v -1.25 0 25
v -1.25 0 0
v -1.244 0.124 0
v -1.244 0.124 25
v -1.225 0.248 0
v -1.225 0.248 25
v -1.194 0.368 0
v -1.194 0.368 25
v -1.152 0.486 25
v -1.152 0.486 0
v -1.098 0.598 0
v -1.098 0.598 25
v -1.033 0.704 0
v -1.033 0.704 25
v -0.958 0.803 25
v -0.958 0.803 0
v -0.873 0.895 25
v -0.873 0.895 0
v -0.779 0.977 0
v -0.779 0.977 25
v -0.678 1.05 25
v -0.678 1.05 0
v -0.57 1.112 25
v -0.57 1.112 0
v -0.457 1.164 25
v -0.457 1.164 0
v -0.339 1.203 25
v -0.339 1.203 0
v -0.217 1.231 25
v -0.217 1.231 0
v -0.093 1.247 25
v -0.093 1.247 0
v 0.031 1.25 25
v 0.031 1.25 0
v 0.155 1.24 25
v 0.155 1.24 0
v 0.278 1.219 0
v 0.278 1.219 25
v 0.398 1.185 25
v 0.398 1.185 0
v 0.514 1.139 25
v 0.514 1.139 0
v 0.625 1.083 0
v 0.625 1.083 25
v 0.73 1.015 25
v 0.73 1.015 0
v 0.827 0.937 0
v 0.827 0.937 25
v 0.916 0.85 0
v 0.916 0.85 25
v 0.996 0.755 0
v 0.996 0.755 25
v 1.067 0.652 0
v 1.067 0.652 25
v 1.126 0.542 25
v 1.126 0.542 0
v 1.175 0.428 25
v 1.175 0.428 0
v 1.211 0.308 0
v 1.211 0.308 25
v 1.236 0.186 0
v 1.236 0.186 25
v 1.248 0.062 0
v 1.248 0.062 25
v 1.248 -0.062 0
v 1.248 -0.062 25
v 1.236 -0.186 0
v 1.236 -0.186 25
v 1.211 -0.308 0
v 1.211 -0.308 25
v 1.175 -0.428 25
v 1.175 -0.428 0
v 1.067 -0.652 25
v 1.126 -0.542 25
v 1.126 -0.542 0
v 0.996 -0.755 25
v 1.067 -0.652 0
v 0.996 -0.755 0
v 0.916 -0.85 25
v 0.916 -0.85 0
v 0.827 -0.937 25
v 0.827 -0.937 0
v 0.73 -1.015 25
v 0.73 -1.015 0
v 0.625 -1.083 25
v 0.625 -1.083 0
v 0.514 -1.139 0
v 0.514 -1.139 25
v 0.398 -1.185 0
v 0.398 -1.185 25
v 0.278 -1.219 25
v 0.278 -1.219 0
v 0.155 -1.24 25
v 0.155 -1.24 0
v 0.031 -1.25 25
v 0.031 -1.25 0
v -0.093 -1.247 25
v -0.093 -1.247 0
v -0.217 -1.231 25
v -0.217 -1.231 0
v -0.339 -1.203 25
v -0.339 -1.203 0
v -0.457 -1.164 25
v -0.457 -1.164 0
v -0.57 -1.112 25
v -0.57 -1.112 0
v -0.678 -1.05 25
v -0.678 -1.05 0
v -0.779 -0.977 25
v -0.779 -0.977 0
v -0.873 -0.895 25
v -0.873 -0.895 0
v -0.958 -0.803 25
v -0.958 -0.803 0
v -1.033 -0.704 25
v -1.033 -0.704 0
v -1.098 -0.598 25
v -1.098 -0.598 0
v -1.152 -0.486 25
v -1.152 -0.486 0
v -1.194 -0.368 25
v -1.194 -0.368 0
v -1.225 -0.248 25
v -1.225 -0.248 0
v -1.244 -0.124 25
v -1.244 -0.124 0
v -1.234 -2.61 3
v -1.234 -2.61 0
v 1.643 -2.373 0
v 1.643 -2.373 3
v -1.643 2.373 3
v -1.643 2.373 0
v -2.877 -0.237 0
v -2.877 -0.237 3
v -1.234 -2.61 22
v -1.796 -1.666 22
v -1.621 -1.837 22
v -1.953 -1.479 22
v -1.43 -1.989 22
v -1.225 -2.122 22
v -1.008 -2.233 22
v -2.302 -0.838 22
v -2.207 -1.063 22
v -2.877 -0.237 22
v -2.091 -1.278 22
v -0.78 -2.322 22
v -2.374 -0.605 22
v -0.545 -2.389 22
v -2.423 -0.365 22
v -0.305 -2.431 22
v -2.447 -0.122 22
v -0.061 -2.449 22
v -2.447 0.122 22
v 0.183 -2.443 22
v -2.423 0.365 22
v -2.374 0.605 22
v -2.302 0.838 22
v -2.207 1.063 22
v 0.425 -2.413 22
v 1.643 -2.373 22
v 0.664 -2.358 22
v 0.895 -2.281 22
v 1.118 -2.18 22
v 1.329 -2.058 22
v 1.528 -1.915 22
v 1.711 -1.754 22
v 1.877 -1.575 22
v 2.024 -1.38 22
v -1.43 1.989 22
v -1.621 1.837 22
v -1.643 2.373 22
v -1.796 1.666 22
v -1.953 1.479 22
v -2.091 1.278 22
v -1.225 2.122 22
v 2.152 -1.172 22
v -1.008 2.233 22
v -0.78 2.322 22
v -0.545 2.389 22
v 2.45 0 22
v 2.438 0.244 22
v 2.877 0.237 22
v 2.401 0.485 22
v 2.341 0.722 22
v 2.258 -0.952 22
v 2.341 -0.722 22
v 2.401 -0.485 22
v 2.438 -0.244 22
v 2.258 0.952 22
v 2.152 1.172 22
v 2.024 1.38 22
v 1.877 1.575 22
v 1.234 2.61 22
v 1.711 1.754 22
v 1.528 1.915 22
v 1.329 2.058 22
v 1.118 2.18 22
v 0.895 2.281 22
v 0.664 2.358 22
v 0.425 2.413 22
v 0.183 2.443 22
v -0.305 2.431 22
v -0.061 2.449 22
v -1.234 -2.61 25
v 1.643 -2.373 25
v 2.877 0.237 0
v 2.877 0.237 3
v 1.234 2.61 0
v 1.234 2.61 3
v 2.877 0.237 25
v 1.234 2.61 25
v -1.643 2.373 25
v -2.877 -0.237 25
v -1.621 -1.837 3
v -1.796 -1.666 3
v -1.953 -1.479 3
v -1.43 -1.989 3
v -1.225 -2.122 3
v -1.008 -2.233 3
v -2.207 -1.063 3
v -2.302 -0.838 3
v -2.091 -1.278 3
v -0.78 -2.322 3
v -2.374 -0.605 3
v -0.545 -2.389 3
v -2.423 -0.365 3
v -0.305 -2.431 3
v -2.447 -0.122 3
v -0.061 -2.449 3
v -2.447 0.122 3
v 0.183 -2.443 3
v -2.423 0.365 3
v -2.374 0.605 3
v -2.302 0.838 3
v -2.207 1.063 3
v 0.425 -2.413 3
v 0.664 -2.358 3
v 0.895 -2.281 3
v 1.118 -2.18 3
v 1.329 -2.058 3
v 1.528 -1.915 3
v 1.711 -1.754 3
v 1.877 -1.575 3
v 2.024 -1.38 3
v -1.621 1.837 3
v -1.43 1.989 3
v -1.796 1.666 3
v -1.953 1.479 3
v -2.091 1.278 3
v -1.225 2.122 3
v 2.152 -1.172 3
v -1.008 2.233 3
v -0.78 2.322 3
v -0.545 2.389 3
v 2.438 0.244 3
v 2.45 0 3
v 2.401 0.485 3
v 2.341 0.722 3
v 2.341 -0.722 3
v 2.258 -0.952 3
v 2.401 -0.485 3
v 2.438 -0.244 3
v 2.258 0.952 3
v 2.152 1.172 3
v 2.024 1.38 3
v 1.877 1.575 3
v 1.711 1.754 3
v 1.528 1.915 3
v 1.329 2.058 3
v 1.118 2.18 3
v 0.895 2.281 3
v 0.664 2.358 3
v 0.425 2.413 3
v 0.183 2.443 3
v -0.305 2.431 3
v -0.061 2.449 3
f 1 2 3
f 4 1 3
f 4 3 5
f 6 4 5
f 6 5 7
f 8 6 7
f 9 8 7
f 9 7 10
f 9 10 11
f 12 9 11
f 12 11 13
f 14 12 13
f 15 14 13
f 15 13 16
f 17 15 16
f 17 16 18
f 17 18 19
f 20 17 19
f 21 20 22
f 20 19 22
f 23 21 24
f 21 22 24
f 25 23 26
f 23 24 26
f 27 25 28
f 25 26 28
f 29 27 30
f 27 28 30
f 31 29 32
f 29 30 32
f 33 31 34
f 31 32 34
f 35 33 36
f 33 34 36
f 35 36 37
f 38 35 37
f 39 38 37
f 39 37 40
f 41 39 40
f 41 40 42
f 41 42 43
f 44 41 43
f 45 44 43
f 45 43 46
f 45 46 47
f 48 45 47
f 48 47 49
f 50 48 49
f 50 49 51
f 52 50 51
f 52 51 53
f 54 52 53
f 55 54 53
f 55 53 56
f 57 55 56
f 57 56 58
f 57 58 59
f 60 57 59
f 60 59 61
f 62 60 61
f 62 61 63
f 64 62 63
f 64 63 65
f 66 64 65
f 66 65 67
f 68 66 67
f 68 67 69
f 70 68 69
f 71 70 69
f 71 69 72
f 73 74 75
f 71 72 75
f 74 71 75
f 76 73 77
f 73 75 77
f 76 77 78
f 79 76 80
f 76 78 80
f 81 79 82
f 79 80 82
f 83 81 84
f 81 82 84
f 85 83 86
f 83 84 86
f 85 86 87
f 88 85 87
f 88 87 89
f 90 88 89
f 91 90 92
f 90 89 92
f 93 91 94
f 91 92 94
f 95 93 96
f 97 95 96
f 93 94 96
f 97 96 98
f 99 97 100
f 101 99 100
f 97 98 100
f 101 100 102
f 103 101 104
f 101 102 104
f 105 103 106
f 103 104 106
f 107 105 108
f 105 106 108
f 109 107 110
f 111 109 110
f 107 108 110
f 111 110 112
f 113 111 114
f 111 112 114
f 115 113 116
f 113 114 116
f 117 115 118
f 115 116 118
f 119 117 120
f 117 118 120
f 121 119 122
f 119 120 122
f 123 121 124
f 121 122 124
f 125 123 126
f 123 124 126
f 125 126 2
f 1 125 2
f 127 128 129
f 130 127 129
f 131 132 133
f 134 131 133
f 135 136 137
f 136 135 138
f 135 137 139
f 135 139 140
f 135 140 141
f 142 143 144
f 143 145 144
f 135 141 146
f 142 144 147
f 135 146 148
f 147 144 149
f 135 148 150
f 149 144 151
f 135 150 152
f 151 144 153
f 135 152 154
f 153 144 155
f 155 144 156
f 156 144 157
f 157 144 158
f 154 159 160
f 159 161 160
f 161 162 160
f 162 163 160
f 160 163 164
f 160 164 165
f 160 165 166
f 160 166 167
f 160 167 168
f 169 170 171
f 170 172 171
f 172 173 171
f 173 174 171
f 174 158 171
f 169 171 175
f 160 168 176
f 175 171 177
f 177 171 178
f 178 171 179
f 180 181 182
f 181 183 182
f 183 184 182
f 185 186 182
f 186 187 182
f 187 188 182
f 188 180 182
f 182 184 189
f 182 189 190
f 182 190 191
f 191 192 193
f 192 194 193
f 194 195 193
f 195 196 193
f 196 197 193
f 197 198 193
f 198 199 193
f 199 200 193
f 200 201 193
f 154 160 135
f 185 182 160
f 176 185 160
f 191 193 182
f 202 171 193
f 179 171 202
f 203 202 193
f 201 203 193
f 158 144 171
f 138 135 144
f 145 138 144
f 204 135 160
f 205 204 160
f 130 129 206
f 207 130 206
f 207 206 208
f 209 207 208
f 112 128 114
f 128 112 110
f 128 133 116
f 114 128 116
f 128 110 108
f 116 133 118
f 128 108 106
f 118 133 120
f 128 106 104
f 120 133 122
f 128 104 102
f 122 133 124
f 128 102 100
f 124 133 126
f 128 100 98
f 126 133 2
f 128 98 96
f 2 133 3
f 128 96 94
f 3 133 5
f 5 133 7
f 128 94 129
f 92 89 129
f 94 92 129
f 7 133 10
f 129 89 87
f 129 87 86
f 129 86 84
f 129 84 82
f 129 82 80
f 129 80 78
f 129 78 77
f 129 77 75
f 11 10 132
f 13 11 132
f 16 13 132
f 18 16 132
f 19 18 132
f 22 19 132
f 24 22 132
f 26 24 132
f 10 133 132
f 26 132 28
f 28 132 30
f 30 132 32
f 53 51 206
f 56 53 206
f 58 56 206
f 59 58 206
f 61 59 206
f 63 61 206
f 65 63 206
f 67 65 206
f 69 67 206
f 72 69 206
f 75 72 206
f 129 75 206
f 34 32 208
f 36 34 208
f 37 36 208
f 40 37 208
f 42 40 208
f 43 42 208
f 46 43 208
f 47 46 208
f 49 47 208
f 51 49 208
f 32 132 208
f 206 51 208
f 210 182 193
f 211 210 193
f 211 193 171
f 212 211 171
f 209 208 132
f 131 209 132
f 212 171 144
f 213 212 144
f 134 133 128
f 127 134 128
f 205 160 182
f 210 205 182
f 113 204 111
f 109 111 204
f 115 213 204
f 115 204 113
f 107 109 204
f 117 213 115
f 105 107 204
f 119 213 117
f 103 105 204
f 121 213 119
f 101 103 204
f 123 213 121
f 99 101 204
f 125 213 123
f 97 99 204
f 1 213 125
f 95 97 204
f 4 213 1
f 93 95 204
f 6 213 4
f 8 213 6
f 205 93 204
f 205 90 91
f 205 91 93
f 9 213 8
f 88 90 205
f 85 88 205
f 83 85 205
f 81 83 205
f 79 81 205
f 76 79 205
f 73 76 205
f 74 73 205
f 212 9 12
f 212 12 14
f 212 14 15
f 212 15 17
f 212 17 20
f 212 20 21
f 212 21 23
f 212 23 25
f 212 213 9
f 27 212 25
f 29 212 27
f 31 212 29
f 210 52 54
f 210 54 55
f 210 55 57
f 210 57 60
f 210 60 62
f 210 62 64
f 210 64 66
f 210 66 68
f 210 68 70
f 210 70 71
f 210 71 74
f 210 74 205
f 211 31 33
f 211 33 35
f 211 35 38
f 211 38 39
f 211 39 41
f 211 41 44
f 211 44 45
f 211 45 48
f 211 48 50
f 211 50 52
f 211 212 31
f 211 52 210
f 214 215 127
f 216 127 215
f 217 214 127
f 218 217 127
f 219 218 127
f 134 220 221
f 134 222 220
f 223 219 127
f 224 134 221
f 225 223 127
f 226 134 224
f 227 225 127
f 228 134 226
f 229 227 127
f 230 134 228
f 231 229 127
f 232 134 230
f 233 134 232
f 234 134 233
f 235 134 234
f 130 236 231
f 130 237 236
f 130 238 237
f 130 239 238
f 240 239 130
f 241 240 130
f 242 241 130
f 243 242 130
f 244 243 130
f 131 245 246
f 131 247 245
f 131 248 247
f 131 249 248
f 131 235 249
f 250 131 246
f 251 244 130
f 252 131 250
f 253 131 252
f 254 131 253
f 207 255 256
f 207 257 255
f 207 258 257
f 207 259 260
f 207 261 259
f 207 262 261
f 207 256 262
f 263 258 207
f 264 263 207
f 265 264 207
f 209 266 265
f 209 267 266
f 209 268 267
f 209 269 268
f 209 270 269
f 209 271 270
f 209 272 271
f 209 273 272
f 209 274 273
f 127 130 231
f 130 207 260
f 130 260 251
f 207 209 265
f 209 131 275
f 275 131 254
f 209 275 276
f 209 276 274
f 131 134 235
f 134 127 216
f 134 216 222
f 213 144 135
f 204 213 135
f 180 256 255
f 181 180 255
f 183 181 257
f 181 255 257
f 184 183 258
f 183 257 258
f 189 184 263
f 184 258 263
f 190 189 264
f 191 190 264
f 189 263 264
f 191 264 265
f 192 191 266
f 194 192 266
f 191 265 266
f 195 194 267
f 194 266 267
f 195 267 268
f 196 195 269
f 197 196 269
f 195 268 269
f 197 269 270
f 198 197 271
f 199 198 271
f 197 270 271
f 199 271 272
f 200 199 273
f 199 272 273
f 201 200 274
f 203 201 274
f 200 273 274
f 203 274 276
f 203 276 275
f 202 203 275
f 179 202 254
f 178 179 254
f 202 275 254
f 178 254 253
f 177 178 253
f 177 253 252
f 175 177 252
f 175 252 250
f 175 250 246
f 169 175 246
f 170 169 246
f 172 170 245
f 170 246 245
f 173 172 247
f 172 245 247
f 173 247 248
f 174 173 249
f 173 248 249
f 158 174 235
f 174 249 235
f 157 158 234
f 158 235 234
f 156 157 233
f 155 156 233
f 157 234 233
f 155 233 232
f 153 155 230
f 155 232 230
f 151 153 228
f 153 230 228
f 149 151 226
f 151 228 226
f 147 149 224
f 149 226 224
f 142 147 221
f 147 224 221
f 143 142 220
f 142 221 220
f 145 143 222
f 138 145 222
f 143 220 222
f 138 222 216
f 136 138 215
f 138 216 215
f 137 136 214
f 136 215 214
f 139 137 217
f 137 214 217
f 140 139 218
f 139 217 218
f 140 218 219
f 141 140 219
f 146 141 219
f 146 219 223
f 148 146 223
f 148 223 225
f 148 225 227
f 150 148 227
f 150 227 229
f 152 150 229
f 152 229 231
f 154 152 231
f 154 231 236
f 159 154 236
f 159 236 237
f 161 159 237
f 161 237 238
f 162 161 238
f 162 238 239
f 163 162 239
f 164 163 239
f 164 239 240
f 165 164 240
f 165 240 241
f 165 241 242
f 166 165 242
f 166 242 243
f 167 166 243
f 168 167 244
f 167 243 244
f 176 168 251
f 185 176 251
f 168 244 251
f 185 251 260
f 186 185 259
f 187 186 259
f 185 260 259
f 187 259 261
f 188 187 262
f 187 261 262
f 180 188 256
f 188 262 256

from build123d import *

# Parameters (mm, degrees)
F1_DEPTH = 25
F3_D     = 2.5
F5_R     = 12.8012424822
F5_R_2   = 2.45
F6_DEPTH = 19


with BuildPart() as f1:
    # F0 (on Top) → F1 (new body)
    with BuildSketch(Plane.XY):
        Polygon((1.643359007, -2.3733319421), (2.877045257, 0.2365246766), (1.2336862499, 2.6098566187), (-1.643359007, 2.3733319421), (-2.877045257, -0.2365246766), (-1.2336862499, -2.6098566187), align=None)
    extrude(amount=F1_DEPTH)

    # F3 (through all)
    with Locations(Plane.XY.offset(25)):
        with Locations((0, 0)):
            Hole(F3_D / 2)


with BuildPart() as f6:
    # F5 (on offset) → F6 (new body)
    with BuildSketch(Plane.XY.offset(3)):
        Circle(F5_R)
        Circle(F5_R_2, mode=Mode.SUBTRACT)
    extrude(amount=F6_DEPTH)


with BuildPart() as f1_1:
    add(f1.part)

    # F7: cut F6
    add(f6.part, mode=Mode.SUBTRACT)


solid = f1_1.part
